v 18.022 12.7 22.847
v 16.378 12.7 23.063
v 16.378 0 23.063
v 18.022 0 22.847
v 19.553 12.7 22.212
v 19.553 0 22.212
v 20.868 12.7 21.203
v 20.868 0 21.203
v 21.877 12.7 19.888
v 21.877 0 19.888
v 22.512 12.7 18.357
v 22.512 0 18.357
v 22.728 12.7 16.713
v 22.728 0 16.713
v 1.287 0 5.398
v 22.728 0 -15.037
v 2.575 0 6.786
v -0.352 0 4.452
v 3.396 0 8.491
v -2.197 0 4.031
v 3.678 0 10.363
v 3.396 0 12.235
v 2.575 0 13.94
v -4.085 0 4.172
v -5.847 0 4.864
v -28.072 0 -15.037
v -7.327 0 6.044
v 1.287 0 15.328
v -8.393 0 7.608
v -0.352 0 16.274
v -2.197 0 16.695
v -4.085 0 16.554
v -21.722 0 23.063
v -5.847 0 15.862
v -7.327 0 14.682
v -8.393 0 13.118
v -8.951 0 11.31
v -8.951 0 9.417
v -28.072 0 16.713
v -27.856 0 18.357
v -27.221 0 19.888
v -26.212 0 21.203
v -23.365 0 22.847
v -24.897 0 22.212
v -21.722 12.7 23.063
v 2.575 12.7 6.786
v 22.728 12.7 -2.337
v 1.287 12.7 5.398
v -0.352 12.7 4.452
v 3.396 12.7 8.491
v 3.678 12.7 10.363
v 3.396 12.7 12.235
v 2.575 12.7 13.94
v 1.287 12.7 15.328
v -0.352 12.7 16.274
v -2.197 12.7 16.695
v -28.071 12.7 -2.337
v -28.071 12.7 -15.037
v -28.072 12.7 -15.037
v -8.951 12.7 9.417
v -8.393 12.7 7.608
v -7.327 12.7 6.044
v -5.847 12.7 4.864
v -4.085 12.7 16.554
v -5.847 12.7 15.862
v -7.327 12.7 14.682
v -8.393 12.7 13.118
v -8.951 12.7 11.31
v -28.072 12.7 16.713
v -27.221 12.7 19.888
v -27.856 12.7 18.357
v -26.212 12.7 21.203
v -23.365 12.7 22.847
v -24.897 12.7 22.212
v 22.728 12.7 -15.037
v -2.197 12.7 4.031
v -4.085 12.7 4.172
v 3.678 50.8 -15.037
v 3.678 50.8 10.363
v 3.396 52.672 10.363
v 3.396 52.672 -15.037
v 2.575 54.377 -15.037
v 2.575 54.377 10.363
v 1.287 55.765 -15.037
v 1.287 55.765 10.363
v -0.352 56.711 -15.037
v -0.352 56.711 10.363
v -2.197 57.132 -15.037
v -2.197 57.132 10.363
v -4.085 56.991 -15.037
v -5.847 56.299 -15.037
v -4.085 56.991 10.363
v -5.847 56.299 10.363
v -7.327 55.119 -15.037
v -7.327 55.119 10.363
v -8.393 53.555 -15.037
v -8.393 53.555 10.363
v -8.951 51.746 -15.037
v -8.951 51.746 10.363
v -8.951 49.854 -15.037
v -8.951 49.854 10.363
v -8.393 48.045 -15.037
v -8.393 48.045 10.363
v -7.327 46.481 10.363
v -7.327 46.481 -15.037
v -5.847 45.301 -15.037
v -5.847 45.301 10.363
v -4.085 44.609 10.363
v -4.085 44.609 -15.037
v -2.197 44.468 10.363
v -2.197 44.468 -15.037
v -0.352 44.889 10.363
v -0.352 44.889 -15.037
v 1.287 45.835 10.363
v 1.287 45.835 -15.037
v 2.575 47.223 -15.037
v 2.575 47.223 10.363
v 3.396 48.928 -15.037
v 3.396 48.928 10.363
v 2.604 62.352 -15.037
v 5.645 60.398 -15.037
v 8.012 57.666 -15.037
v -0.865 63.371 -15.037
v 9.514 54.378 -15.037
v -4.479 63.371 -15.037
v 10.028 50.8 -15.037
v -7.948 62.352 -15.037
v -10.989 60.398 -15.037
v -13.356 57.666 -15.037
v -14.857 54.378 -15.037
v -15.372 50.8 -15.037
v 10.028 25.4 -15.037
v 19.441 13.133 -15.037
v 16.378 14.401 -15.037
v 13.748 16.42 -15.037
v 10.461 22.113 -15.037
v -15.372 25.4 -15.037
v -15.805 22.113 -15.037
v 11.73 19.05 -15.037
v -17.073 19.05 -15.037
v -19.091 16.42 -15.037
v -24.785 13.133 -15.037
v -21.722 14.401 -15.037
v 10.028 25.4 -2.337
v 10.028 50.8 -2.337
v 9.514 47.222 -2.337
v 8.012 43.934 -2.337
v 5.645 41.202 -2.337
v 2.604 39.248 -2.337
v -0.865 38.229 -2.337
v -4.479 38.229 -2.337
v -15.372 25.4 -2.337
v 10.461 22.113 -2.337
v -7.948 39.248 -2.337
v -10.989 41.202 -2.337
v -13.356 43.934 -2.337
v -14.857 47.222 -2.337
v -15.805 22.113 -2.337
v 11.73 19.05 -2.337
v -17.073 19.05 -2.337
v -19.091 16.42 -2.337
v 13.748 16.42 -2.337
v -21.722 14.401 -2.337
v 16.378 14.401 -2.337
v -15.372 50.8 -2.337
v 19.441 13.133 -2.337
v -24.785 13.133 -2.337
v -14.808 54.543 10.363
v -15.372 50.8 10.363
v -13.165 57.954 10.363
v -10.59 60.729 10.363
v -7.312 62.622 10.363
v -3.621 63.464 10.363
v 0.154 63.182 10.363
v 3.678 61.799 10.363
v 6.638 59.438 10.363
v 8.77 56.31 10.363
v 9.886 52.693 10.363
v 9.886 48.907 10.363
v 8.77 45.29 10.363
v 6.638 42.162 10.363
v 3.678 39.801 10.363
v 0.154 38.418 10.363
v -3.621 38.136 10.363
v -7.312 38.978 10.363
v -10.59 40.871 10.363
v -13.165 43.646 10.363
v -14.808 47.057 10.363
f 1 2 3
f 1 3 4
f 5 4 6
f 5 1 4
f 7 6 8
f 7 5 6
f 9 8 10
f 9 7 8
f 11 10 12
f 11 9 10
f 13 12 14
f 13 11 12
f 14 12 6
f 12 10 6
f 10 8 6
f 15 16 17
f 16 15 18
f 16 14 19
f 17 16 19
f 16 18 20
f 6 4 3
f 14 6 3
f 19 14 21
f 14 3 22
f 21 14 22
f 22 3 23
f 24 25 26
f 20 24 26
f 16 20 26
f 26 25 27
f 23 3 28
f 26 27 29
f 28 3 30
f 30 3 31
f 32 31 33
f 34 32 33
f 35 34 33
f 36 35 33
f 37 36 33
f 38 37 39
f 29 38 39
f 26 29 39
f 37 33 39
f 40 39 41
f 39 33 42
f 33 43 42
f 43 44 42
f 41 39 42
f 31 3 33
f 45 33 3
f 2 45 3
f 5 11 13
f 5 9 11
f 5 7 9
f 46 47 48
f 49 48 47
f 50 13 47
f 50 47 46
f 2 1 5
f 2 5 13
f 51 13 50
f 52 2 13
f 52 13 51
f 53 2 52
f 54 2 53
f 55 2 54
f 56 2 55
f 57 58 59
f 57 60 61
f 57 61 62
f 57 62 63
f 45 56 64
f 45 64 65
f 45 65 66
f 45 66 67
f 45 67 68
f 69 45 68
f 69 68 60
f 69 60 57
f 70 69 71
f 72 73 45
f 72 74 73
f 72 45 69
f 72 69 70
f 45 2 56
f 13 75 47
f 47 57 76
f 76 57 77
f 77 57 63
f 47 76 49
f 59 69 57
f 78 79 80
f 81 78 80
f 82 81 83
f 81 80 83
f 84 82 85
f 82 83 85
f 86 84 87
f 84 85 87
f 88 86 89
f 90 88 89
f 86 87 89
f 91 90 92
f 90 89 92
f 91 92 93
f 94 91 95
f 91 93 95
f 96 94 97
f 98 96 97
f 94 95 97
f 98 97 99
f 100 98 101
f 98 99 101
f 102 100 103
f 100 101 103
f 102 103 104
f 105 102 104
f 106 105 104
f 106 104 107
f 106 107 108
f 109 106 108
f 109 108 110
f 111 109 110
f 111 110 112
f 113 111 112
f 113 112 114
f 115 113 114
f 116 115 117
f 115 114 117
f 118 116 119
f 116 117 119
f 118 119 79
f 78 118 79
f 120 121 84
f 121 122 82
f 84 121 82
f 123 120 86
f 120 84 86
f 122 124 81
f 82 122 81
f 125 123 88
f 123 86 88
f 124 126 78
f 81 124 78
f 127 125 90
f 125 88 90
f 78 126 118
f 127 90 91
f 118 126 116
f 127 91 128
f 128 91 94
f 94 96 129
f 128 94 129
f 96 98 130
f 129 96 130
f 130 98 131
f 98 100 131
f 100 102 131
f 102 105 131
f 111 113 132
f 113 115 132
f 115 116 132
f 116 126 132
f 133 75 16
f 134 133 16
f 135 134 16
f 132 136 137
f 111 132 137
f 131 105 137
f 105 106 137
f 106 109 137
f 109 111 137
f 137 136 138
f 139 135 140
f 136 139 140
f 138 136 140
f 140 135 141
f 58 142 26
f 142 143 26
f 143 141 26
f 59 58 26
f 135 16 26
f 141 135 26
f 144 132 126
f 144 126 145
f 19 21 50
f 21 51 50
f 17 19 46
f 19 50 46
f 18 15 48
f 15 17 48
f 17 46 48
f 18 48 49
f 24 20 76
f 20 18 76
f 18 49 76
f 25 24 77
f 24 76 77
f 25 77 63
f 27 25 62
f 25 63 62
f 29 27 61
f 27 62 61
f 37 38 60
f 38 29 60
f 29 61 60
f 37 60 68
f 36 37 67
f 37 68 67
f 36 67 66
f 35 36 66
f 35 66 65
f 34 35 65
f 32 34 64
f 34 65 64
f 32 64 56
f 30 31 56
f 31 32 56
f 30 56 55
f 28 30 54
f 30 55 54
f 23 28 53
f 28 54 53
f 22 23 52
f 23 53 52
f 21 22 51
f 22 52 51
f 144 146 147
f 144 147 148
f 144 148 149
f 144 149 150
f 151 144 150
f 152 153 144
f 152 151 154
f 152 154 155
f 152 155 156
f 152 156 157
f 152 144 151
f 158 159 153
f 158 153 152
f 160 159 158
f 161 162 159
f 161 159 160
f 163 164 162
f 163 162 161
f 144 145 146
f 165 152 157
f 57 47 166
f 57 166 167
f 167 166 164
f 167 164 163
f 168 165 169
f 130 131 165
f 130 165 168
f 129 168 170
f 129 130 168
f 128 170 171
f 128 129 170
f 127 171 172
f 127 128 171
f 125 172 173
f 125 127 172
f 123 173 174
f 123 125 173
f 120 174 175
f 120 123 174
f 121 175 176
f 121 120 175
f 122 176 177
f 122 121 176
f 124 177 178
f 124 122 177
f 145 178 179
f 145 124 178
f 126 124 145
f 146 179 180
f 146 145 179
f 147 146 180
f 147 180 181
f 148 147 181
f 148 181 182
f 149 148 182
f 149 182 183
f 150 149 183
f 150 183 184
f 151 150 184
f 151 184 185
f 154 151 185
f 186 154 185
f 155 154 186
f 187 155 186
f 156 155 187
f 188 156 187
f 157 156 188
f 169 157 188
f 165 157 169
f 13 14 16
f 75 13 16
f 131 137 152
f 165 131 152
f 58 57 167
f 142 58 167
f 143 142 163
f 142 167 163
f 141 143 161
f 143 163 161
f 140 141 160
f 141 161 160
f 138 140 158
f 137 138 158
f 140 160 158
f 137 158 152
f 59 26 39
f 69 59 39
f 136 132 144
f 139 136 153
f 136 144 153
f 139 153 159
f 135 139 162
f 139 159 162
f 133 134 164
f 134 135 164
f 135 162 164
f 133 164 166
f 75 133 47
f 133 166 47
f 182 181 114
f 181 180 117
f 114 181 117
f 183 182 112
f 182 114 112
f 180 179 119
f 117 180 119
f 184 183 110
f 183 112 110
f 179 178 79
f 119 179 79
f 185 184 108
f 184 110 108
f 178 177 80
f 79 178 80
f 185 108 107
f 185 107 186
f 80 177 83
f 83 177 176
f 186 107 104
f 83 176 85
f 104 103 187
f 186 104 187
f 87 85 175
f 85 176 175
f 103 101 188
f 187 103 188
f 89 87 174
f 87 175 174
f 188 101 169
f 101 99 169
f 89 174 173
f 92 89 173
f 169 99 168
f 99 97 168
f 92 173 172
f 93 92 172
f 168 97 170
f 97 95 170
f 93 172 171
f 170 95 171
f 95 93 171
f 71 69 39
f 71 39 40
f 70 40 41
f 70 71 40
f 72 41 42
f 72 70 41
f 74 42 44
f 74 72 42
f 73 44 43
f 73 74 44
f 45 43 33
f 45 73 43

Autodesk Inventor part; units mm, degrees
ref_plane "YZ Plane" through (0, 0, 0) normal (1, 0, 0) x (0, 1, 0)
ref_plane "XZ Plane" through (0, 0, 0) normal (0, 1, 0) x (-1, 0, 0)
ref_plane "XY Plane" through (0, 0, 0) normal (0, 0, 1) x (1, 0, 0)
sketch "Sketch1" plane through (0, 0, 0) normal (0, 1, 0) x (-1, 0, 0)
  line L0 (28.0719, 23.0631) -> (-22.7281, 23.0631)
  line L1 (-22.7281, 23.0631) -> (-22.7281, -15.0369)
  line L2 (-22.7281, -15.0369) -> (28.0719, -15.0369)
  line L3 (28.0719, -15.0369) -> (28.0719, 23.0631)
  point P0 (0, 0)
  dimension "d0" = 50.8
  dimension "d1" = 38.1
extrude "Extrusion1" add sketch "Sketch1" along normal blind 12.7
sketch "Sketch2" plane through (0, 12.7, 0) normal (0, 1, 0) x (1, 0, 0)
  line L0 (22.7281, -23.0631) -> (22.7281, 15.0369) projected
  line L1 (22.7281, 15.0369) -> (10.0281, 15.0369)
  line L2 (10.0281, 15.0369) -> (10.0281, 2.3369)
  line L3 (10.0281, 2.3369) -> (22.7281, 2.3369)
  line L4 (22.7281, 2.3369) -> (22.7281, 15.0369)
  line L5 (22.7281, 15.0369) -> (-28.0719, 15.0369) projected
  line L6 (-28.0719, 15.0369) -> (-15.3719, 15.0369)
  line L7 (-15.3719, 15.0369) -> (-15.3719, 2.3369)
  line L8 (-15.3719, 2.3369) -> (-28.0719, 2.3369)
  line L9 (-28.0719, 2.3369) -> (-28.0719, 15.0369)
  line L10 (-15.3719, 15.0369) -> (10.0281, 15.0369)
  line L11 (10.0281, 15.0369) -> (10.0281, 2.3369)
  line L12 (10.0281, 2.3369) -> (-15.3719, 2.3369)
  line L13 (-15.3719, 2.3369) -> (-15.3719, 15.0369)
  point P0 (0, 0)
  dimension "d4" = 12.7
  dimension "d5" = 12.7
  dimension "d6" = 12.7
  dimension "d7" = 12.7
extrude "Extrusion2" add sketch "Sketch2" along normal blind 38.1 contours L12 L7 L5 L2
fillet "Fillet1" radius 12.7 1 edges at (10.0281, 12.7, -8.6869)
fillet "Fillet2" radius 12.7 1 edges at (-15.3719, 12.7, -8.6869)
sketch "Sketch3" plane through (22.7281, 0, -15.0369) normal (0, 0, -1) x (-1, 0, 0)
  line L0 (12.7, 25.4) -> (12.7, 50.8) projected
  line L1 (12.7, 50.8) -> (25.4, 50.8)
  line L2 (12.7, 50.8) -> (38.1, 50.8) projected
  circle A0 centre (25.4, 50.8) radius 12.7
  point P0 (22.7281, 0)
  dimension "d12" = 12.7
  dimension "d13" = 25.4
extrude "Extrusion3" add sketch "Sketch3" against normal blind 25.4
sketch "Sketch4" plane through (-2.6719, 50.8, 10.3631) normal (0, 0, 1) x (1, 0, 0)
  circle A0 centre (0, 0) radius 6.35
  point P0 (2.6719, -50.8)
  dimension "d16" = 12.7
extrude "Extrusion4" cut sketch "Sketch4" against normal blind 25.4
fillet "Fillet3" radius 6.35 1 edges at (22.7281, 6.35, 23.0631)
fillet "Fillet4" radius 6.35 1 edges at (-28.0719, 6.35, 23.0631)
sketch "Sketch6" plane through (0, 12.7, 0) normal (0, 1, 0) x (1, 0, 0)
  line L0 (-21.7219, -23.0631) -> (16.3781, -23.0631) projected
  line L1 (-2.6719, -23.0631) -> (-2.6719, -10.3631)
  circle A0 centre (-2.6719, -10.3631) radius 6.35
  point P0 (0, 0)
  dimension "d22" = 12.7
  dimension "d23" = 12.7
extrude "Extrusion5" cut sketch "Sketch6" against normal blind 25.4
